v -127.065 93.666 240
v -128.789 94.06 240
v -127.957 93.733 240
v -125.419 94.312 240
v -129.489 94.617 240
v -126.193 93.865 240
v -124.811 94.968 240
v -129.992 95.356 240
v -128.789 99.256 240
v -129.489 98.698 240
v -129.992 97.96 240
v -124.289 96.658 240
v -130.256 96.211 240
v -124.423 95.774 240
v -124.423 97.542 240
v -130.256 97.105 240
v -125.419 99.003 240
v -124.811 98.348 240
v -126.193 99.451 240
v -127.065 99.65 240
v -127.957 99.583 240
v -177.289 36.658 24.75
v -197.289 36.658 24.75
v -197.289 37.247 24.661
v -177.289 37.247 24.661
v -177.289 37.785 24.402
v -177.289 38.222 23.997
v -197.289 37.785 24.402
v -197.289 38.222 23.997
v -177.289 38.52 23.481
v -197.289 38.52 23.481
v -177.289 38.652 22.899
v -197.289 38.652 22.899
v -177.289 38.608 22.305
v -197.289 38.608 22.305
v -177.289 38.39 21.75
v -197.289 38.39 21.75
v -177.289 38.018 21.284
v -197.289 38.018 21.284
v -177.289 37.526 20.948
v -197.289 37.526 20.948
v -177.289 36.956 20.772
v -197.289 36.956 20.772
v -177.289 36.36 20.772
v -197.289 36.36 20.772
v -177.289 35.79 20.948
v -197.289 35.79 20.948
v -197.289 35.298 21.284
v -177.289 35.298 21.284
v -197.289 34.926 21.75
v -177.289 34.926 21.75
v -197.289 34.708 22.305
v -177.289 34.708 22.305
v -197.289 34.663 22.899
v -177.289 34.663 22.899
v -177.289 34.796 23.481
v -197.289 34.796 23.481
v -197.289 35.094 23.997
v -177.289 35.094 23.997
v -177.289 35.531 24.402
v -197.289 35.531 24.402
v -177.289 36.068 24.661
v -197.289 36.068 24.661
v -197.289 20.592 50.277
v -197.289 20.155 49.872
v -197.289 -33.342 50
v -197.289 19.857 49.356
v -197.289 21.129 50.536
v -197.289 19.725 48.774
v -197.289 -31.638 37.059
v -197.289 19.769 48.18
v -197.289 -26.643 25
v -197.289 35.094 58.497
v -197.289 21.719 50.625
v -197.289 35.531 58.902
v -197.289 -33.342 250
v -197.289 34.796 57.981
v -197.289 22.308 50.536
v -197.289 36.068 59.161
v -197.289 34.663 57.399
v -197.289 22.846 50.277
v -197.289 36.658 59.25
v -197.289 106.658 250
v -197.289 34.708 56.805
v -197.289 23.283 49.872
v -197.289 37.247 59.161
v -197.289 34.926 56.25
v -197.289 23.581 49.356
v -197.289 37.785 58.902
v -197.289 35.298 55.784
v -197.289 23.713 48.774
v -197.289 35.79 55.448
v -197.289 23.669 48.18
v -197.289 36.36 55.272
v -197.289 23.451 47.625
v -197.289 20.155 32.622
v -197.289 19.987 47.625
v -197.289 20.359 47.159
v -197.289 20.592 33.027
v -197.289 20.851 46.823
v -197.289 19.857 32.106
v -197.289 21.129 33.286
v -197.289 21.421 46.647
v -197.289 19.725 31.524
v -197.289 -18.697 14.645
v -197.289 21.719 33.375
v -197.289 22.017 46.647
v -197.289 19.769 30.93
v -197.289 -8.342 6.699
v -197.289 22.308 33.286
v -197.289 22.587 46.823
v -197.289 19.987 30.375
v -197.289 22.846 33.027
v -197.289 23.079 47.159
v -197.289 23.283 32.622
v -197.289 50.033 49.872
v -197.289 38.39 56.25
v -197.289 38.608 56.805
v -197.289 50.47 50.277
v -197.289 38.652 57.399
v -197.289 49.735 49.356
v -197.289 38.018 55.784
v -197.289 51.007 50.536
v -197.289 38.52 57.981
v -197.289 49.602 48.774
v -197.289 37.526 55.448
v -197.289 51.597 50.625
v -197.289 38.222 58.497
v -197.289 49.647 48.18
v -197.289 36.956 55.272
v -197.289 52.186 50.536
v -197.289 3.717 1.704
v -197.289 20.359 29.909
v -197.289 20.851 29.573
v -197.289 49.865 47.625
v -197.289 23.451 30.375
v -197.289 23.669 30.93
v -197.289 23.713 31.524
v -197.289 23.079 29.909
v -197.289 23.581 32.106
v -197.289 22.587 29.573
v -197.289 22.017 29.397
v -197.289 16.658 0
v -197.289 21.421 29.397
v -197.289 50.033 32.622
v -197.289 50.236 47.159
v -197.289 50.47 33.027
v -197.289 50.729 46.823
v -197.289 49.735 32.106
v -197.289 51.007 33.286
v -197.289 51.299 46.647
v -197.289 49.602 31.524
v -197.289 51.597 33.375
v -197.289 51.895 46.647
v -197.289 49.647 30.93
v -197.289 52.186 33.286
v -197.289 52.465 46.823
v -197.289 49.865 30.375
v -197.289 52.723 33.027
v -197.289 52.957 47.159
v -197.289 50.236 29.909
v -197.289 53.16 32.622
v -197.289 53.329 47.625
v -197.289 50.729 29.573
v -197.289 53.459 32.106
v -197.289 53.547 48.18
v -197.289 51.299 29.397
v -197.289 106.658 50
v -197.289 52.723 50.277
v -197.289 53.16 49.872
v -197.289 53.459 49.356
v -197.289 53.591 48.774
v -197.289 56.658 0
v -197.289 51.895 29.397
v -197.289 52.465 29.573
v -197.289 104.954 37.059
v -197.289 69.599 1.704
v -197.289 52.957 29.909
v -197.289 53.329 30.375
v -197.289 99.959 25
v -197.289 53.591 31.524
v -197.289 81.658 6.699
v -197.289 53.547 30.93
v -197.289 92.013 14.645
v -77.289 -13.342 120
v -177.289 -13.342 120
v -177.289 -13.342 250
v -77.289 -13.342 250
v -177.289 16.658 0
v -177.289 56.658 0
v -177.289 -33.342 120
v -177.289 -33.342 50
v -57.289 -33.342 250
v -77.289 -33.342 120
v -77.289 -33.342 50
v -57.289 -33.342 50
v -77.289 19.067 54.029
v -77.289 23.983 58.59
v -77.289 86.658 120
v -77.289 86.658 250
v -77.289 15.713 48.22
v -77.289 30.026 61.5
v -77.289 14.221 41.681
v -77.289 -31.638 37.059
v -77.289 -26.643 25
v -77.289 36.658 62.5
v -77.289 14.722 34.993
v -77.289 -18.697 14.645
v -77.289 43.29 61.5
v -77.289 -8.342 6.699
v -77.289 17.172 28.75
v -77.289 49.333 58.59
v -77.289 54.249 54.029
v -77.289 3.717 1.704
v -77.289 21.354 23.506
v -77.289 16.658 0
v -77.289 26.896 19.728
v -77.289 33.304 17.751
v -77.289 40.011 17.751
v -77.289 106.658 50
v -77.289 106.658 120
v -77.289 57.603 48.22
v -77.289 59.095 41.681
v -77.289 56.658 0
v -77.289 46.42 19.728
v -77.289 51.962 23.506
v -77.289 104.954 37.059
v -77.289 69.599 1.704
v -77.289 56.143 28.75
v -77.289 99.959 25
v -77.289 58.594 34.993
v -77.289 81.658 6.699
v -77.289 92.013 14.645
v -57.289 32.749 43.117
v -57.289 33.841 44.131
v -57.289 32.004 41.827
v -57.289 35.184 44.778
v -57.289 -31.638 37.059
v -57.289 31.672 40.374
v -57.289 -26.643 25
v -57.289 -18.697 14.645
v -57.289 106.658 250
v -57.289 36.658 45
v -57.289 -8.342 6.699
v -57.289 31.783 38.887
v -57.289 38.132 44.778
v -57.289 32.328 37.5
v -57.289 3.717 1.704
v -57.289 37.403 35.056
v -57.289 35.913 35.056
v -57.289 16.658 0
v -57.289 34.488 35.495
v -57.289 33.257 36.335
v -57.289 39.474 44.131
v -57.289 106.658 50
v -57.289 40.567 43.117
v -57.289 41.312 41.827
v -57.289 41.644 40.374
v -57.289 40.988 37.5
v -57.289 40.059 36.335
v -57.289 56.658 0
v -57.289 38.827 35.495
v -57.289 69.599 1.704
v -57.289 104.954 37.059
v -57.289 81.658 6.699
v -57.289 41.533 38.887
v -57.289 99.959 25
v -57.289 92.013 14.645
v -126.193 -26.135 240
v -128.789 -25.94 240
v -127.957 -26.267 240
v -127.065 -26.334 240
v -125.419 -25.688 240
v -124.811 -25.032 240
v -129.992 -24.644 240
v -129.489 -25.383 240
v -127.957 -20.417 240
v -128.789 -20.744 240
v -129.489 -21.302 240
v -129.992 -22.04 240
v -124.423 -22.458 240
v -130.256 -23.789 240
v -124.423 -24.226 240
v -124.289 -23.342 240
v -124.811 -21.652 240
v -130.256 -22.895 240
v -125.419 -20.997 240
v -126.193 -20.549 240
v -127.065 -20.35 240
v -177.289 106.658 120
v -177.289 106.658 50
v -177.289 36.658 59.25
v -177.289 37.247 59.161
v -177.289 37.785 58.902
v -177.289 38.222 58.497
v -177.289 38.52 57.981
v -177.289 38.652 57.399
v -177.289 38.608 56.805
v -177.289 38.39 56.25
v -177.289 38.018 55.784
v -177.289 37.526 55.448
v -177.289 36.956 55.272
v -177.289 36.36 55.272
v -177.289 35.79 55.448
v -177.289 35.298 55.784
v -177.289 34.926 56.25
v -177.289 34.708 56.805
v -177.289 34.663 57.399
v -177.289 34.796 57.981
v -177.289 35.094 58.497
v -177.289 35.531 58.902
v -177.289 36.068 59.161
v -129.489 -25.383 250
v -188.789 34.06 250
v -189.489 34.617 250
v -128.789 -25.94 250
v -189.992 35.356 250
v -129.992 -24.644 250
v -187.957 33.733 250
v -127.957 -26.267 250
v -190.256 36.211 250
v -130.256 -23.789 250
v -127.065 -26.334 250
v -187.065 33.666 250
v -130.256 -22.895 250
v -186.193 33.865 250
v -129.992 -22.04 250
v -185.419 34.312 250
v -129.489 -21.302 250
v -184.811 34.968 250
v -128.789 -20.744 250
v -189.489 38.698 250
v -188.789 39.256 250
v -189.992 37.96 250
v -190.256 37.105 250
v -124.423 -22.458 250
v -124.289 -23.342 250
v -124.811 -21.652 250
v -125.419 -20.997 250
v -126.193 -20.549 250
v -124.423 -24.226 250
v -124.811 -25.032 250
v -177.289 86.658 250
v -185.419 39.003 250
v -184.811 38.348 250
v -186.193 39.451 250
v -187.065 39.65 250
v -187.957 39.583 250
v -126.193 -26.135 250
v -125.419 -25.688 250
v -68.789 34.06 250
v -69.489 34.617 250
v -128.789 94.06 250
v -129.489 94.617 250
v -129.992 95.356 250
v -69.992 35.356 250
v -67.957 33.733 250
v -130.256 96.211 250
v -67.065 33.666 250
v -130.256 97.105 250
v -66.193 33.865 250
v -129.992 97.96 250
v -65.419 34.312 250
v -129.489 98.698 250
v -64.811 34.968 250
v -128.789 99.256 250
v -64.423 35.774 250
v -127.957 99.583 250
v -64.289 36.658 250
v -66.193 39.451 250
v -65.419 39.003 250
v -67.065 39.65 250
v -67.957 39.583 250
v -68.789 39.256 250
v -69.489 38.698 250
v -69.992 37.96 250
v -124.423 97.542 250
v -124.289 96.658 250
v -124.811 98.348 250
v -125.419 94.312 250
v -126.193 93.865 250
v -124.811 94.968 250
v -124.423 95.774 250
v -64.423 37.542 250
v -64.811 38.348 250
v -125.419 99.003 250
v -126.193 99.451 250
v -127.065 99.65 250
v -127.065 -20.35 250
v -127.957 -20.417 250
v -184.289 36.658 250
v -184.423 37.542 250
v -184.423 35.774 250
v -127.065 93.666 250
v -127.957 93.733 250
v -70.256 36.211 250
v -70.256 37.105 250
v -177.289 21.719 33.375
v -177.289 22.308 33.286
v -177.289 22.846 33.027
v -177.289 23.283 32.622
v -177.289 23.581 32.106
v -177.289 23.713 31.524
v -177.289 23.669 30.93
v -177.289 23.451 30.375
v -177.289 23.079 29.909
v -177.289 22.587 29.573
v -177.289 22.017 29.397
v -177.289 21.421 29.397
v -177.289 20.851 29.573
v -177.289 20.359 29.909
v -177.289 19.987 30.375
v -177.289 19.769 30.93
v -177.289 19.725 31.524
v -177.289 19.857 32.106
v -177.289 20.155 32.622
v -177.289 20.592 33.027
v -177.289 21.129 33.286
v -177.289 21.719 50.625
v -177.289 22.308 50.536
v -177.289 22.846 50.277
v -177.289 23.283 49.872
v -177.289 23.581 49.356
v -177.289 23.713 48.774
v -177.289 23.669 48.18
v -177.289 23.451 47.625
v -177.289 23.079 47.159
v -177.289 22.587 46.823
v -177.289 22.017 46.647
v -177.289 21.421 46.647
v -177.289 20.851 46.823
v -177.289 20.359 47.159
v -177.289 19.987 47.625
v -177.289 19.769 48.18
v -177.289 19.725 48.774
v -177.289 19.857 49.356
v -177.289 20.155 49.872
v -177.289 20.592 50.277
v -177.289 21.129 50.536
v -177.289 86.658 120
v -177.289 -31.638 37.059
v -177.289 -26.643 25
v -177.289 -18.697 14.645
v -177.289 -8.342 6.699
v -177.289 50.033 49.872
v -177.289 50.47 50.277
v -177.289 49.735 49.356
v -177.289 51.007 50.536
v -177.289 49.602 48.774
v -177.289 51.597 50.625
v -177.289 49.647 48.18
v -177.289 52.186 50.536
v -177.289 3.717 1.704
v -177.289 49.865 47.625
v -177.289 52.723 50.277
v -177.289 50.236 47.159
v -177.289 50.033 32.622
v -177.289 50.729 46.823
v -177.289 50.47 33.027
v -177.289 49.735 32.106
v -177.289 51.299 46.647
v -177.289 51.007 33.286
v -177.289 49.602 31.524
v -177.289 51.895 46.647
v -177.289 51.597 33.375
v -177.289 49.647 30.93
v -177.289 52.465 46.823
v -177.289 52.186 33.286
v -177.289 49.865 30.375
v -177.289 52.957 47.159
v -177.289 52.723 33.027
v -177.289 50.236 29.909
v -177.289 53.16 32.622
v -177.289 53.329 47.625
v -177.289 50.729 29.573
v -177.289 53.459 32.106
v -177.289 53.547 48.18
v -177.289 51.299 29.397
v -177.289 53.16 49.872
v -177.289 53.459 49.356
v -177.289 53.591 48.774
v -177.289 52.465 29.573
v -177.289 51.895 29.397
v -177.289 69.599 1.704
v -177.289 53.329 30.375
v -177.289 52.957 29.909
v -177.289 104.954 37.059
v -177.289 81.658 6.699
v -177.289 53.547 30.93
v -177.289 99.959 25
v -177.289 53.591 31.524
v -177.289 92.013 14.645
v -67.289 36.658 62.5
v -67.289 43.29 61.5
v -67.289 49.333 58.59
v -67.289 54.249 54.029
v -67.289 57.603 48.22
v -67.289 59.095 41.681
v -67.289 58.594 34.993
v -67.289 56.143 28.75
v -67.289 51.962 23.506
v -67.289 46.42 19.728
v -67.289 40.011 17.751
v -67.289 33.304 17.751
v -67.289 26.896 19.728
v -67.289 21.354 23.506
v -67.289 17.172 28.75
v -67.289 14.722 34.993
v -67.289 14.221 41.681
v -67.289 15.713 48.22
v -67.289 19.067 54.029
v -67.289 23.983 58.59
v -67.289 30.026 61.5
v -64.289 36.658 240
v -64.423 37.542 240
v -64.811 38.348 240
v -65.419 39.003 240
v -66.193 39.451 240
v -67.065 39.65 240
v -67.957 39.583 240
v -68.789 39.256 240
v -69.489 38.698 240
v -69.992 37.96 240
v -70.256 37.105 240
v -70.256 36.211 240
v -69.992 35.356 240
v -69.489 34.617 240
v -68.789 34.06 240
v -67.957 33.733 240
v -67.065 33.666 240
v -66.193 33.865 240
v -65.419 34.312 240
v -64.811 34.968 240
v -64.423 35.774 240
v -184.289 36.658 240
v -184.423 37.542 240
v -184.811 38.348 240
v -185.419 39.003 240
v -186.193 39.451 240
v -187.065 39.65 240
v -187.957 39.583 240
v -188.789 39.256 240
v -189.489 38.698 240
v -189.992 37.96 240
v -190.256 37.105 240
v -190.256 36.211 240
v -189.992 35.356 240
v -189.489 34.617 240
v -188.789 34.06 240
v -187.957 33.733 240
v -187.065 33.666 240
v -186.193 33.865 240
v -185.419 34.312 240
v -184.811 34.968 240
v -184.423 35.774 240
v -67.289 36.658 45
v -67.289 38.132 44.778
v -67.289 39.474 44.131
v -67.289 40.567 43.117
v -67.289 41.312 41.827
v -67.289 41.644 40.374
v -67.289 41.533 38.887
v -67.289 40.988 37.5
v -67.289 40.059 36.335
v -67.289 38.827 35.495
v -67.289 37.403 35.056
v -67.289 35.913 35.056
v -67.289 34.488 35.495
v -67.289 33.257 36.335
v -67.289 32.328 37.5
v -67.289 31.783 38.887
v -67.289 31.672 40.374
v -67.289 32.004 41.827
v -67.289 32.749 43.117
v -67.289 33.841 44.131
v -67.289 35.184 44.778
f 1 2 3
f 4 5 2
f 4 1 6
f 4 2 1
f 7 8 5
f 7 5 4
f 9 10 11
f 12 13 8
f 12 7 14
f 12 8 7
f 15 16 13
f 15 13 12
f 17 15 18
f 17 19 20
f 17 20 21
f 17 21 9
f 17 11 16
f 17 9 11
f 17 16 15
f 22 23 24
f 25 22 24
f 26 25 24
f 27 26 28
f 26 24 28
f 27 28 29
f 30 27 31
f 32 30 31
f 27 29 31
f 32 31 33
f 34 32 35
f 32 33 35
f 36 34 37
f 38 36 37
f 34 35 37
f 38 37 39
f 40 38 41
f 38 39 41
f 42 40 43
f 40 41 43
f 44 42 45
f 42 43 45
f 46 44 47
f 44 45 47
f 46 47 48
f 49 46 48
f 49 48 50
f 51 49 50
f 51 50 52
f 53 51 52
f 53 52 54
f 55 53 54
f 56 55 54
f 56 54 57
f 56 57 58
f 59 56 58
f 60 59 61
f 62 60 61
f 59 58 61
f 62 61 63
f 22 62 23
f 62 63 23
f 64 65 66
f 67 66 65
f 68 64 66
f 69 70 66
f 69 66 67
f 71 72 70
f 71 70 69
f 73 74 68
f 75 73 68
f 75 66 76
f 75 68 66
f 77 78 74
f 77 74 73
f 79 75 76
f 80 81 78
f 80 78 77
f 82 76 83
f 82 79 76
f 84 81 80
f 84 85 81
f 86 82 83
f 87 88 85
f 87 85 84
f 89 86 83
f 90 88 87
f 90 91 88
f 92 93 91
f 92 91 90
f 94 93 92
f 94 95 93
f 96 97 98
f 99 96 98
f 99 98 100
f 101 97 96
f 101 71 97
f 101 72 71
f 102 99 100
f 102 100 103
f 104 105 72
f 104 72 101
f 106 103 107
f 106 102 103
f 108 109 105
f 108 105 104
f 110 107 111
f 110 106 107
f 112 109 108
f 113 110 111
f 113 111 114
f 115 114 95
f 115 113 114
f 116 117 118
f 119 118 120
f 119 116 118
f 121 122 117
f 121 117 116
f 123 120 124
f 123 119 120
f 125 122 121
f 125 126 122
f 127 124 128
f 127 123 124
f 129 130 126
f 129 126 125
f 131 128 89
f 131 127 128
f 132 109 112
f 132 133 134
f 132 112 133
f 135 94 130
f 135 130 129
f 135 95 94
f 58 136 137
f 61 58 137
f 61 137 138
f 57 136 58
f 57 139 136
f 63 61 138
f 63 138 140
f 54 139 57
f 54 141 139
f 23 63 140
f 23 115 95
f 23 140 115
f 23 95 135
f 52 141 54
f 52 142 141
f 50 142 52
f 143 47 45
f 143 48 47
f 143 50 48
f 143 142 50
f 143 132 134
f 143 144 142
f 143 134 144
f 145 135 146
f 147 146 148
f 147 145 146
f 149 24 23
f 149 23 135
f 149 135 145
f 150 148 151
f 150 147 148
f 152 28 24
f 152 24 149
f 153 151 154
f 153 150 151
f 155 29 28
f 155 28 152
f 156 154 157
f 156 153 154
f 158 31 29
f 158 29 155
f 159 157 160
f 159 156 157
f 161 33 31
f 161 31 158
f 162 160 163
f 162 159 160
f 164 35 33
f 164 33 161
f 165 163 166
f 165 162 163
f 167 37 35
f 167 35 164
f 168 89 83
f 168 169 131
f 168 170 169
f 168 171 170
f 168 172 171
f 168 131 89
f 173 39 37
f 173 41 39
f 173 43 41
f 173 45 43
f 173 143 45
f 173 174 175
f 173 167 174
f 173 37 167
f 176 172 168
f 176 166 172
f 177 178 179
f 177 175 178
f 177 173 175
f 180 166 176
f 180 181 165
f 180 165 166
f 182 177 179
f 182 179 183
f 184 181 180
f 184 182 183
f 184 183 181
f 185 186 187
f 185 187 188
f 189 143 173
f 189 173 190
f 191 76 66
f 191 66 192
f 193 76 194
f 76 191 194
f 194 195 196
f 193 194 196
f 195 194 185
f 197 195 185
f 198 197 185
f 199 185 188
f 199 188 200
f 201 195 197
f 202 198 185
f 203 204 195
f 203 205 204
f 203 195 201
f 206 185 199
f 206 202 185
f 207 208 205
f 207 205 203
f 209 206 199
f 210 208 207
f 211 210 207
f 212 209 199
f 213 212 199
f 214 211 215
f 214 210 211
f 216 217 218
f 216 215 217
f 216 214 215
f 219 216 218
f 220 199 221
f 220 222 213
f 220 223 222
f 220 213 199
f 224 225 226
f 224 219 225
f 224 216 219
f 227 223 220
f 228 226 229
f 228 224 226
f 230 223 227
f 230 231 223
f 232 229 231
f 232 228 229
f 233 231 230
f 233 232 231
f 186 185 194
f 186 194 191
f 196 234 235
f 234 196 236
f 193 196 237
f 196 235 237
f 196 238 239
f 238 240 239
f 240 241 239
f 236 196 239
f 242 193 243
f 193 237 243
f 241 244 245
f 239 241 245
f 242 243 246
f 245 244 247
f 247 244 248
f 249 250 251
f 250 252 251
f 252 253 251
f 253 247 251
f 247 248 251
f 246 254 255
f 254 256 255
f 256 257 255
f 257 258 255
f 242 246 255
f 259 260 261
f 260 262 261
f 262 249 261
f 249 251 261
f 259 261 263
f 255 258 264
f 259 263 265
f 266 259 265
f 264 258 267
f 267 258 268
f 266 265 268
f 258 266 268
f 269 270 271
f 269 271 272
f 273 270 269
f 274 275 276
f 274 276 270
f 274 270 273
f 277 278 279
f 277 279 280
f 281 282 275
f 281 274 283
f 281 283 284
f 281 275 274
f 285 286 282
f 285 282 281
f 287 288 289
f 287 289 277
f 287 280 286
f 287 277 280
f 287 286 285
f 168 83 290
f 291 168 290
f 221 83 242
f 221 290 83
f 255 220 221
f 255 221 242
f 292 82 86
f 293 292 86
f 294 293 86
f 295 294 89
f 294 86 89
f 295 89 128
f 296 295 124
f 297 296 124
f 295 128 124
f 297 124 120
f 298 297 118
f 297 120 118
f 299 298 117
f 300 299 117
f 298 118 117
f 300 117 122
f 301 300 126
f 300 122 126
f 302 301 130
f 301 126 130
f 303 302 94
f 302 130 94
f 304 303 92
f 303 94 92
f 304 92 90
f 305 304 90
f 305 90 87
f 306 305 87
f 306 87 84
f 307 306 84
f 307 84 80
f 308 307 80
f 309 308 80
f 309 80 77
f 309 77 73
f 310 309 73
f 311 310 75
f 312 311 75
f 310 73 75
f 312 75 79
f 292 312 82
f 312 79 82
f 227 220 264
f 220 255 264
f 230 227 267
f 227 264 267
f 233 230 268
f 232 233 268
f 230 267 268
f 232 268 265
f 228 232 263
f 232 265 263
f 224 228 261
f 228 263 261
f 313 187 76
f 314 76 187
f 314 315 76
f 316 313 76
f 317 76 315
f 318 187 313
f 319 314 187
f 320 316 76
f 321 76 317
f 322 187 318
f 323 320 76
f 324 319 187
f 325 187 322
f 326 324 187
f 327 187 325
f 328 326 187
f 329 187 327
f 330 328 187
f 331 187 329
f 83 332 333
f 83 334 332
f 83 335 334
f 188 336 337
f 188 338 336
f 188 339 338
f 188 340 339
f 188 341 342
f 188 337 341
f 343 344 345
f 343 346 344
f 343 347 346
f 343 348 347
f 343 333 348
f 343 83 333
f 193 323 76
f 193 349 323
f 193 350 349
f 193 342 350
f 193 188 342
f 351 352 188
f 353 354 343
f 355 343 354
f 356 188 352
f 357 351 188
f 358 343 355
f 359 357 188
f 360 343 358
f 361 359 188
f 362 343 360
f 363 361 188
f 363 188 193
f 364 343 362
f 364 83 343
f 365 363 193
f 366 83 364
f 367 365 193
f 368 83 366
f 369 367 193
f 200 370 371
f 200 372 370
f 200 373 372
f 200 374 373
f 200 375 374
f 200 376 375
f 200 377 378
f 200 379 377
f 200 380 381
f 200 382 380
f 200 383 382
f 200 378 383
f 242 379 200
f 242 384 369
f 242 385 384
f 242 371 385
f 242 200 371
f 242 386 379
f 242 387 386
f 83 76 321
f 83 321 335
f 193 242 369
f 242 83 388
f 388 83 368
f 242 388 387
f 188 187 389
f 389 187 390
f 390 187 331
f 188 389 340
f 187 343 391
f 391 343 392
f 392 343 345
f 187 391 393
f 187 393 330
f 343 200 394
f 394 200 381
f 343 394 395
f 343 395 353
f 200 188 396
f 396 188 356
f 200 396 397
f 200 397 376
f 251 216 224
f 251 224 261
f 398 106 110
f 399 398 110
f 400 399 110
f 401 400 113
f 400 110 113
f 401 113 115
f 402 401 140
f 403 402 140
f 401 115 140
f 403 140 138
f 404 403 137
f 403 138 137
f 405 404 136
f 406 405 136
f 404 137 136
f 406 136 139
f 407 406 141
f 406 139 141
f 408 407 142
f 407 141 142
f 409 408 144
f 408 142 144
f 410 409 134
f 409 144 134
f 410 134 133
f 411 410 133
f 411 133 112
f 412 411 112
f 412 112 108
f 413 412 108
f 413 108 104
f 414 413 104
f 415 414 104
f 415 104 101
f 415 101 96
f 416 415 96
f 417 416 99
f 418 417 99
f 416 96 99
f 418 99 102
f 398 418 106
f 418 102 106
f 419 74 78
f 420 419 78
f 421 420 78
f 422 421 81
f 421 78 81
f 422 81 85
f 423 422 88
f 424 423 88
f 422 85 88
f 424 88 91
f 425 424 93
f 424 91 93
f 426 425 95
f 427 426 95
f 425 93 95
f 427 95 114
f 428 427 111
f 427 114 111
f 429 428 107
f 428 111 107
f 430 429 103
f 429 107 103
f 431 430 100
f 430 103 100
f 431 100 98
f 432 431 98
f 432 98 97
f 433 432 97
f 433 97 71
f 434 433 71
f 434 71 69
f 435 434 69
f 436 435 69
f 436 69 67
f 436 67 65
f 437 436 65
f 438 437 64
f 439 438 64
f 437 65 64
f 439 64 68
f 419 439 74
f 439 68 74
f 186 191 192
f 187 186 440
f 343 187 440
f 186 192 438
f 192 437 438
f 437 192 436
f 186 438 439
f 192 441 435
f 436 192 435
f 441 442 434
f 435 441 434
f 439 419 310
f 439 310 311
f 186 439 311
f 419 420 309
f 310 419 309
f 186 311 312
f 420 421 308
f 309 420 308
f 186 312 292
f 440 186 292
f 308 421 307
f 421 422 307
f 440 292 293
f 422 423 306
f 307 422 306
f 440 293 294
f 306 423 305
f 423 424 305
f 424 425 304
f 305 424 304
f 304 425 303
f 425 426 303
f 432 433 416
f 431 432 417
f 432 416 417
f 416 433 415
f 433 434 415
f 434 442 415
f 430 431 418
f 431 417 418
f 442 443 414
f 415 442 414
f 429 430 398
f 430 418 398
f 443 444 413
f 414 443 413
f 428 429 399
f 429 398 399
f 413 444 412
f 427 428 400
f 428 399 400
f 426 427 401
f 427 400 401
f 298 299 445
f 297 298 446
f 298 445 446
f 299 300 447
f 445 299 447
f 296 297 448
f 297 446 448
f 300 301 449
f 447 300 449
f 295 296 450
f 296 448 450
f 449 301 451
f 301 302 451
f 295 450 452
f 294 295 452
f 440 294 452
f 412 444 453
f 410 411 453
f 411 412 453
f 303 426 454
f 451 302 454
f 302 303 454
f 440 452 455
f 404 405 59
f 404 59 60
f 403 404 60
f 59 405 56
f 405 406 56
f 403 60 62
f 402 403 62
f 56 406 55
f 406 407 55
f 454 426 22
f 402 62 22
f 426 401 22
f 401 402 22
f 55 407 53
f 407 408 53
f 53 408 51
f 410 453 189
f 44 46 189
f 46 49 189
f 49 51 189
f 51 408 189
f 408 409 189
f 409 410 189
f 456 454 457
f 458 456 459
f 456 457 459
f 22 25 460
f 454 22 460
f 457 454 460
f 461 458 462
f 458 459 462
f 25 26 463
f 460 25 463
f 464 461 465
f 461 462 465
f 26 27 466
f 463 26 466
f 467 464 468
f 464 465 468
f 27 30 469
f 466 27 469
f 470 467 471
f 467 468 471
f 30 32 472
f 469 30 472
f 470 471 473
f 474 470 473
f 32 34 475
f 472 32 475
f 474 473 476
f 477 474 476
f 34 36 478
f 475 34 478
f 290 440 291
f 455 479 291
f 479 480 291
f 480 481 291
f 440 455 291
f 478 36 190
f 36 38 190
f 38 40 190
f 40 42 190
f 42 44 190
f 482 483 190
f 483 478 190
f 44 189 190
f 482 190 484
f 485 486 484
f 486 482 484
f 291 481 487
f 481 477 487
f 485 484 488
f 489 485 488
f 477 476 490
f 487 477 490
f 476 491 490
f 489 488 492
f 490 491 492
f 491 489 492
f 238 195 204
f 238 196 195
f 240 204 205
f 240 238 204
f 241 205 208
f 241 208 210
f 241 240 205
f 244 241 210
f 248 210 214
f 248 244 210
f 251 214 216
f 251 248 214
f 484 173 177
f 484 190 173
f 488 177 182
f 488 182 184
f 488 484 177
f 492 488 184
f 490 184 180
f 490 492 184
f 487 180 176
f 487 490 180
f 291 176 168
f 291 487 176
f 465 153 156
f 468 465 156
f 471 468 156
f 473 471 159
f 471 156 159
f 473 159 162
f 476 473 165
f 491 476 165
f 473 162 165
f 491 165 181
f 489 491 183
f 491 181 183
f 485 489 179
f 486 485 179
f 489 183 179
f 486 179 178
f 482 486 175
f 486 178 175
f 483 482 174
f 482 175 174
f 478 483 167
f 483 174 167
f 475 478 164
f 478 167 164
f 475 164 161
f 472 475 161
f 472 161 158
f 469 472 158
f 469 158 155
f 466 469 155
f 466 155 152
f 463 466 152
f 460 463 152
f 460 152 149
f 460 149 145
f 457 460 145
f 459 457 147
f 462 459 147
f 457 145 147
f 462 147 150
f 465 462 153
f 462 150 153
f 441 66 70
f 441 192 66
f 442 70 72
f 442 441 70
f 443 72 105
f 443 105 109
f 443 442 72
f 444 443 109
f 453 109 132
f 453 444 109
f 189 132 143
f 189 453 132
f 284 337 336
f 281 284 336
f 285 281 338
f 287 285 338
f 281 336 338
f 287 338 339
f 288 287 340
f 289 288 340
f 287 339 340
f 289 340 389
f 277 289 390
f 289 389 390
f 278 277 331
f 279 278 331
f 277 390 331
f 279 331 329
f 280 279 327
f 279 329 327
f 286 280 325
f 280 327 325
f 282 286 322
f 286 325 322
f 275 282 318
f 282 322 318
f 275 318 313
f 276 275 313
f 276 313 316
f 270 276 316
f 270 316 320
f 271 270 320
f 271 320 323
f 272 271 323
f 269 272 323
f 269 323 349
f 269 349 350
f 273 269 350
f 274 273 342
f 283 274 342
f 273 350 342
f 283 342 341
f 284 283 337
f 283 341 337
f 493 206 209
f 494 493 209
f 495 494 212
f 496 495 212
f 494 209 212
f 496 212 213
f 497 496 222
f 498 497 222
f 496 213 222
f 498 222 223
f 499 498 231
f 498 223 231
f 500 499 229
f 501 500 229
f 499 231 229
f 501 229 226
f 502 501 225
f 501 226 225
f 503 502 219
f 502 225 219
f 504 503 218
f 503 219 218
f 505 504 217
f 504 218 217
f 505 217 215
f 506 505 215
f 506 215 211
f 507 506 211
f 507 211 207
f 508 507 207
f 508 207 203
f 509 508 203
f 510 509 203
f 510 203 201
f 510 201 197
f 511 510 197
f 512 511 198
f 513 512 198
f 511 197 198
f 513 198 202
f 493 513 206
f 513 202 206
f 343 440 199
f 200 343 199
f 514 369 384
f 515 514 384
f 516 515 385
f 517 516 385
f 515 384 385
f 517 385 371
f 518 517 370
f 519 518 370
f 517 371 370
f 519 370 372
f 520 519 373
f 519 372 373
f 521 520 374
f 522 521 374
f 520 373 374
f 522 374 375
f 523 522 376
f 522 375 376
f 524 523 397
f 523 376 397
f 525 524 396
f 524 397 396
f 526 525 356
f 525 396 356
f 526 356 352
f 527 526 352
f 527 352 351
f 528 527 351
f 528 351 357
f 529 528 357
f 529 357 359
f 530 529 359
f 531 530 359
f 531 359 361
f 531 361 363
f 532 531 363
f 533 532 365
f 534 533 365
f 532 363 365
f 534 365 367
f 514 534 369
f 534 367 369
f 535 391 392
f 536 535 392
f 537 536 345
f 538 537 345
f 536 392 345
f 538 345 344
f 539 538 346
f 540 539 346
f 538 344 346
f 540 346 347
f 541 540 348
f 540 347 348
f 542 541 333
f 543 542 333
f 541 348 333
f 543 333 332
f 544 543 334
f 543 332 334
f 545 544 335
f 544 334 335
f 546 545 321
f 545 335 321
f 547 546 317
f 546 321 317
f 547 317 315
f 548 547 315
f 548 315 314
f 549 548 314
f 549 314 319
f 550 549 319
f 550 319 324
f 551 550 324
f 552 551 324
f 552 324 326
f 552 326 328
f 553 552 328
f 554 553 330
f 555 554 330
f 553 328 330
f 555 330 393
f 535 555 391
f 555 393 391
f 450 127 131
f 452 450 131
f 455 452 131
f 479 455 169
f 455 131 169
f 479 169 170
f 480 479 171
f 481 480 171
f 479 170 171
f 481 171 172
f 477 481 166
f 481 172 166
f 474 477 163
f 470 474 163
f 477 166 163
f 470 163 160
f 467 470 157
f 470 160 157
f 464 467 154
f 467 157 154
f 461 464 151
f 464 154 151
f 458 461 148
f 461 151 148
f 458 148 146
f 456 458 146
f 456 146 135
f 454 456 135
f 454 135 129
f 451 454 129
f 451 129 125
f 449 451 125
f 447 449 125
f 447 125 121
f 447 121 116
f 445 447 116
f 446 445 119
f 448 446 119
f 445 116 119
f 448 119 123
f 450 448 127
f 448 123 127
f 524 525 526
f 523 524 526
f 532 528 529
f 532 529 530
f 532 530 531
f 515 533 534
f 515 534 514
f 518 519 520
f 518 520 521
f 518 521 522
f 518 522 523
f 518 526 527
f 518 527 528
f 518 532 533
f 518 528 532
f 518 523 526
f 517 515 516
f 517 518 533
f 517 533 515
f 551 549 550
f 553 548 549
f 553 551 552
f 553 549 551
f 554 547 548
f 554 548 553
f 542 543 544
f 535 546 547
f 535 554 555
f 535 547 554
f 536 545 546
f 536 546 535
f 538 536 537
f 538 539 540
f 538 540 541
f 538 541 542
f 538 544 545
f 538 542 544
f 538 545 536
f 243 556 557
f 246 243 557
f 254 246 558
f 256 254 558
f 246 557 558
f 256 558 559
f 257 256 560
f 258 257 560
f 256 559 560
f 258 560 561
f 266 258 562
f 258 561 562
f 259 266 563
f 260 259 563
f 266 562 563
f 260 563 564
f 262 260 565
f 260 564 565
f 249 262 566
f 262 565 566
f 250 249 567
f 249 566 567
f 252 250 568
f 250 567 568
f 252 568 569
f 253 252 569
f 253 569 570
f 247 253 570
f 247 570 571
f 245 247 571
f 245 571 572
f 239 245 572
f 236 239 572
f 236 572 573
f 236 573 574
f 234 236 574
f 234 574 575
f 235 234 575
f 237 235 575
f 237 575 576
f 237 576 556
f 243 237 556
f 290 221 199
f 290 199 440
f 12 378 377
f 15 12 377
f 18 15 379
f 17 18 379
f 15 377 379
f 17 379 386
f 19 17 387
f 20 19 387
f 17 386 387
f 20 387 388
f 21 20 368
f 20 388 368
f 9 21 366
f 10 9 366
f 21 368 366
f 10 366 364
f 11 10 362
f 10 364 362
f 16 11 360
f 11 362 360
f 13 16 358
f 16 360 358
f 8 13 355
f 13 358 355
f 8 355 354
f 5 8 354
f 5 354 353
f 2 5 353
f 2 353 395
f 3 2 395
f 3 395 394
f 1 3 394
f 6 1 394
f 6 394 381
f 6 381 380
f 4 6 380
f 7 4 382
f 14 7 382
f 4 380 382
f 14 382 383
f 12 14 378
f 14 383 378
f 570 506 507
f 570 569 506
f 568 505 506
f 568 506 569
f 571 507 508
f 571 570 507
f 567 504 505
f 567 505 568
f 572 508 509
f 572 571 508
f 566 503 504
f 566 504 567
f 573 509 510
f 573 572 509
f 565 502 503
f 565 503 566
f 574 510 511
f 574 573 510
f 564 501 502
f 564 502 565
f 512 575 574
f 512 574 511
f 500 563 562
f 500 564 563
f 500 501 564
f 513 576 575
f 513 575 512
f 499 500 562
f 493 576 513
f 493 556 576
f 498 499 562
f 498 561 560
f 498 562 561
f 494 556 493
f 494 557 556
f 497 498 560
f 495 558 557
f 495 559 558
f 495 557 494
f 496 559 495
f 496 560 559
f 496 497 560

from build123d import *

# Parameters (mm, degrees)
SKETCH_1_W           = 140
SKETCH_1_H           = 140
SKETCH_1_W_2         = 100
SKETCH_1_H_2         = 100
EXTRUDE_3_DEPTH      = 250
SKETCH_2_W           = 100
SKETCH_2_H           = 140
CUT_EXTRUDE_1_DEPTH  = 120
SKETCH_4_R           = 15.704370783
SKETCH_4_R_2         = 3
CUT_EXTRUDE_2_DEPTH  = 10
SKETCH_8_R           = 2
CUT_EXTRUDE_3_DEPTH  = 20
FILLET_1_R           = 50
SKETCH_10_R          = 22.5
CUT_EXTRUDE_4_DEPTH  = 10
SKETCH_11_R          = 5
CUT_EXTRUDE_10_DEPTH = 12


with BuildPart() as part:
    # 草图1 → 凸台-拉伸3 (new body)
    with BuildSketch(Plane.XY):
        with Locations((-127.289473684, 36.657894737)):
            Rectangle(SKETCH_1_W, SKETCH_1_H)
        with Locations((-127.289473684, 36.657894737)):
            Rectangle(SKETCH_1_W_2, SKETCH_1_H_2, mode=Mode.SUBTRACT)
    extrude(amount=EXTRUDE_3_DEPTH)

    # 草图2 → 切除-拉伸1 (cut)
    with BuildSketch(Plane(origin=(0, 0, 0), x_dir=(-1, 0, 0), z_dir=(0, 0, -1))):
        with Locations((127.289473684, 36.657894737)):
            Rectangle(SKETCH_2_W, SKETCH_2_H)
    extrude(amount=-CUT_EXTRUDE_1_DEPTH, mode=Mode.SUBTRACT)

    # 草图4 → 切除-拉伸2 (cut)
    with BuildSketch(Plane.XY.offset(250)):
        with Locations((-127.289473684, 36.657894737)):
            Circle(SKETCH_4_R)
        with Locations((-187.289473684, 36.657894737)):
            Circle(SKETCH_4_R_2)
        with Locations((-127.289473684, 96.657894737)):
            Circle(SKETCH_4_R_2)
        with Locations((-67.289473684, 36.657894737)):
            Circle(SKETCH_4_R_2)
        with Locations((-127.289473684, -23.342105263)):
            Circle(SKETCH_4_R_2)
    extrude(amount=-CUT_EXTRUDE_2_DEPTH, mode=Mode.SUBTRACT)

    # 草图8 → 切除-拉伸3 (cut)
    with BuildSketch(Plane.ZY.offset(197.289473684)):
        with Locations((22.75, 36.657894737)):
            Circle(SKETCH_8_R)
        with Locations((31.375, 51.596832952)):
            Circle(SKETCH_8_R)
        with Locations((48.625, 51.596832952)):
            Circle(SKETCH_8_R)
        with Locations((57.25, 36.657894737)):
            Circle(SKETCH_8_R)
        with Locations((48.625, 21.718956522)):
            Circle(SKETCH_8_R)
        with Locations((31.375, 21.718956522)):
            Circle(SKETCH_8_R)
    extrude(amount=-CUT_EXTRUDE_3_DEPTH, mode=Mode.SUBTRACT)

    # 圆角1
    fillet_1_edges = [part.edges().sort_by_distance(p)[0] for p in [
        (-67.289473684, -33.342105263, 0),
        (-187.289473684, 106.657894737, 0),
        (-187.289473684, -33.342105263, 0),
        (-67.289473684, 106.657894737, 0),
    ]]
    fillet(fillet_1_edges, radius=FILLET_1_R)

    # 草图10 → 切除-拉伸4 (cut)
    with BuildSketch(Plane.ZY.offset(77.289473684)):
        with Locations((40, 36.657894737)):
            Circle(SKETCH_10_R)
    extrude(amount=-CUT_EXTRUDE_4_DEPTH, mode=Mode.SUBTRACT)

    # 草图11 → 切除-拉伸10 (cut)
    with BuildSketch(Plane.ZY.offset(67.289473684)):
        with Locations((40, 36.657894737)):
            Circle(SKETCH_11_R)
    extrude(amount=-CUT_EXTRUDE_10_DEPTH, mode=Mode.SUBTRACT)


solid = part.part
